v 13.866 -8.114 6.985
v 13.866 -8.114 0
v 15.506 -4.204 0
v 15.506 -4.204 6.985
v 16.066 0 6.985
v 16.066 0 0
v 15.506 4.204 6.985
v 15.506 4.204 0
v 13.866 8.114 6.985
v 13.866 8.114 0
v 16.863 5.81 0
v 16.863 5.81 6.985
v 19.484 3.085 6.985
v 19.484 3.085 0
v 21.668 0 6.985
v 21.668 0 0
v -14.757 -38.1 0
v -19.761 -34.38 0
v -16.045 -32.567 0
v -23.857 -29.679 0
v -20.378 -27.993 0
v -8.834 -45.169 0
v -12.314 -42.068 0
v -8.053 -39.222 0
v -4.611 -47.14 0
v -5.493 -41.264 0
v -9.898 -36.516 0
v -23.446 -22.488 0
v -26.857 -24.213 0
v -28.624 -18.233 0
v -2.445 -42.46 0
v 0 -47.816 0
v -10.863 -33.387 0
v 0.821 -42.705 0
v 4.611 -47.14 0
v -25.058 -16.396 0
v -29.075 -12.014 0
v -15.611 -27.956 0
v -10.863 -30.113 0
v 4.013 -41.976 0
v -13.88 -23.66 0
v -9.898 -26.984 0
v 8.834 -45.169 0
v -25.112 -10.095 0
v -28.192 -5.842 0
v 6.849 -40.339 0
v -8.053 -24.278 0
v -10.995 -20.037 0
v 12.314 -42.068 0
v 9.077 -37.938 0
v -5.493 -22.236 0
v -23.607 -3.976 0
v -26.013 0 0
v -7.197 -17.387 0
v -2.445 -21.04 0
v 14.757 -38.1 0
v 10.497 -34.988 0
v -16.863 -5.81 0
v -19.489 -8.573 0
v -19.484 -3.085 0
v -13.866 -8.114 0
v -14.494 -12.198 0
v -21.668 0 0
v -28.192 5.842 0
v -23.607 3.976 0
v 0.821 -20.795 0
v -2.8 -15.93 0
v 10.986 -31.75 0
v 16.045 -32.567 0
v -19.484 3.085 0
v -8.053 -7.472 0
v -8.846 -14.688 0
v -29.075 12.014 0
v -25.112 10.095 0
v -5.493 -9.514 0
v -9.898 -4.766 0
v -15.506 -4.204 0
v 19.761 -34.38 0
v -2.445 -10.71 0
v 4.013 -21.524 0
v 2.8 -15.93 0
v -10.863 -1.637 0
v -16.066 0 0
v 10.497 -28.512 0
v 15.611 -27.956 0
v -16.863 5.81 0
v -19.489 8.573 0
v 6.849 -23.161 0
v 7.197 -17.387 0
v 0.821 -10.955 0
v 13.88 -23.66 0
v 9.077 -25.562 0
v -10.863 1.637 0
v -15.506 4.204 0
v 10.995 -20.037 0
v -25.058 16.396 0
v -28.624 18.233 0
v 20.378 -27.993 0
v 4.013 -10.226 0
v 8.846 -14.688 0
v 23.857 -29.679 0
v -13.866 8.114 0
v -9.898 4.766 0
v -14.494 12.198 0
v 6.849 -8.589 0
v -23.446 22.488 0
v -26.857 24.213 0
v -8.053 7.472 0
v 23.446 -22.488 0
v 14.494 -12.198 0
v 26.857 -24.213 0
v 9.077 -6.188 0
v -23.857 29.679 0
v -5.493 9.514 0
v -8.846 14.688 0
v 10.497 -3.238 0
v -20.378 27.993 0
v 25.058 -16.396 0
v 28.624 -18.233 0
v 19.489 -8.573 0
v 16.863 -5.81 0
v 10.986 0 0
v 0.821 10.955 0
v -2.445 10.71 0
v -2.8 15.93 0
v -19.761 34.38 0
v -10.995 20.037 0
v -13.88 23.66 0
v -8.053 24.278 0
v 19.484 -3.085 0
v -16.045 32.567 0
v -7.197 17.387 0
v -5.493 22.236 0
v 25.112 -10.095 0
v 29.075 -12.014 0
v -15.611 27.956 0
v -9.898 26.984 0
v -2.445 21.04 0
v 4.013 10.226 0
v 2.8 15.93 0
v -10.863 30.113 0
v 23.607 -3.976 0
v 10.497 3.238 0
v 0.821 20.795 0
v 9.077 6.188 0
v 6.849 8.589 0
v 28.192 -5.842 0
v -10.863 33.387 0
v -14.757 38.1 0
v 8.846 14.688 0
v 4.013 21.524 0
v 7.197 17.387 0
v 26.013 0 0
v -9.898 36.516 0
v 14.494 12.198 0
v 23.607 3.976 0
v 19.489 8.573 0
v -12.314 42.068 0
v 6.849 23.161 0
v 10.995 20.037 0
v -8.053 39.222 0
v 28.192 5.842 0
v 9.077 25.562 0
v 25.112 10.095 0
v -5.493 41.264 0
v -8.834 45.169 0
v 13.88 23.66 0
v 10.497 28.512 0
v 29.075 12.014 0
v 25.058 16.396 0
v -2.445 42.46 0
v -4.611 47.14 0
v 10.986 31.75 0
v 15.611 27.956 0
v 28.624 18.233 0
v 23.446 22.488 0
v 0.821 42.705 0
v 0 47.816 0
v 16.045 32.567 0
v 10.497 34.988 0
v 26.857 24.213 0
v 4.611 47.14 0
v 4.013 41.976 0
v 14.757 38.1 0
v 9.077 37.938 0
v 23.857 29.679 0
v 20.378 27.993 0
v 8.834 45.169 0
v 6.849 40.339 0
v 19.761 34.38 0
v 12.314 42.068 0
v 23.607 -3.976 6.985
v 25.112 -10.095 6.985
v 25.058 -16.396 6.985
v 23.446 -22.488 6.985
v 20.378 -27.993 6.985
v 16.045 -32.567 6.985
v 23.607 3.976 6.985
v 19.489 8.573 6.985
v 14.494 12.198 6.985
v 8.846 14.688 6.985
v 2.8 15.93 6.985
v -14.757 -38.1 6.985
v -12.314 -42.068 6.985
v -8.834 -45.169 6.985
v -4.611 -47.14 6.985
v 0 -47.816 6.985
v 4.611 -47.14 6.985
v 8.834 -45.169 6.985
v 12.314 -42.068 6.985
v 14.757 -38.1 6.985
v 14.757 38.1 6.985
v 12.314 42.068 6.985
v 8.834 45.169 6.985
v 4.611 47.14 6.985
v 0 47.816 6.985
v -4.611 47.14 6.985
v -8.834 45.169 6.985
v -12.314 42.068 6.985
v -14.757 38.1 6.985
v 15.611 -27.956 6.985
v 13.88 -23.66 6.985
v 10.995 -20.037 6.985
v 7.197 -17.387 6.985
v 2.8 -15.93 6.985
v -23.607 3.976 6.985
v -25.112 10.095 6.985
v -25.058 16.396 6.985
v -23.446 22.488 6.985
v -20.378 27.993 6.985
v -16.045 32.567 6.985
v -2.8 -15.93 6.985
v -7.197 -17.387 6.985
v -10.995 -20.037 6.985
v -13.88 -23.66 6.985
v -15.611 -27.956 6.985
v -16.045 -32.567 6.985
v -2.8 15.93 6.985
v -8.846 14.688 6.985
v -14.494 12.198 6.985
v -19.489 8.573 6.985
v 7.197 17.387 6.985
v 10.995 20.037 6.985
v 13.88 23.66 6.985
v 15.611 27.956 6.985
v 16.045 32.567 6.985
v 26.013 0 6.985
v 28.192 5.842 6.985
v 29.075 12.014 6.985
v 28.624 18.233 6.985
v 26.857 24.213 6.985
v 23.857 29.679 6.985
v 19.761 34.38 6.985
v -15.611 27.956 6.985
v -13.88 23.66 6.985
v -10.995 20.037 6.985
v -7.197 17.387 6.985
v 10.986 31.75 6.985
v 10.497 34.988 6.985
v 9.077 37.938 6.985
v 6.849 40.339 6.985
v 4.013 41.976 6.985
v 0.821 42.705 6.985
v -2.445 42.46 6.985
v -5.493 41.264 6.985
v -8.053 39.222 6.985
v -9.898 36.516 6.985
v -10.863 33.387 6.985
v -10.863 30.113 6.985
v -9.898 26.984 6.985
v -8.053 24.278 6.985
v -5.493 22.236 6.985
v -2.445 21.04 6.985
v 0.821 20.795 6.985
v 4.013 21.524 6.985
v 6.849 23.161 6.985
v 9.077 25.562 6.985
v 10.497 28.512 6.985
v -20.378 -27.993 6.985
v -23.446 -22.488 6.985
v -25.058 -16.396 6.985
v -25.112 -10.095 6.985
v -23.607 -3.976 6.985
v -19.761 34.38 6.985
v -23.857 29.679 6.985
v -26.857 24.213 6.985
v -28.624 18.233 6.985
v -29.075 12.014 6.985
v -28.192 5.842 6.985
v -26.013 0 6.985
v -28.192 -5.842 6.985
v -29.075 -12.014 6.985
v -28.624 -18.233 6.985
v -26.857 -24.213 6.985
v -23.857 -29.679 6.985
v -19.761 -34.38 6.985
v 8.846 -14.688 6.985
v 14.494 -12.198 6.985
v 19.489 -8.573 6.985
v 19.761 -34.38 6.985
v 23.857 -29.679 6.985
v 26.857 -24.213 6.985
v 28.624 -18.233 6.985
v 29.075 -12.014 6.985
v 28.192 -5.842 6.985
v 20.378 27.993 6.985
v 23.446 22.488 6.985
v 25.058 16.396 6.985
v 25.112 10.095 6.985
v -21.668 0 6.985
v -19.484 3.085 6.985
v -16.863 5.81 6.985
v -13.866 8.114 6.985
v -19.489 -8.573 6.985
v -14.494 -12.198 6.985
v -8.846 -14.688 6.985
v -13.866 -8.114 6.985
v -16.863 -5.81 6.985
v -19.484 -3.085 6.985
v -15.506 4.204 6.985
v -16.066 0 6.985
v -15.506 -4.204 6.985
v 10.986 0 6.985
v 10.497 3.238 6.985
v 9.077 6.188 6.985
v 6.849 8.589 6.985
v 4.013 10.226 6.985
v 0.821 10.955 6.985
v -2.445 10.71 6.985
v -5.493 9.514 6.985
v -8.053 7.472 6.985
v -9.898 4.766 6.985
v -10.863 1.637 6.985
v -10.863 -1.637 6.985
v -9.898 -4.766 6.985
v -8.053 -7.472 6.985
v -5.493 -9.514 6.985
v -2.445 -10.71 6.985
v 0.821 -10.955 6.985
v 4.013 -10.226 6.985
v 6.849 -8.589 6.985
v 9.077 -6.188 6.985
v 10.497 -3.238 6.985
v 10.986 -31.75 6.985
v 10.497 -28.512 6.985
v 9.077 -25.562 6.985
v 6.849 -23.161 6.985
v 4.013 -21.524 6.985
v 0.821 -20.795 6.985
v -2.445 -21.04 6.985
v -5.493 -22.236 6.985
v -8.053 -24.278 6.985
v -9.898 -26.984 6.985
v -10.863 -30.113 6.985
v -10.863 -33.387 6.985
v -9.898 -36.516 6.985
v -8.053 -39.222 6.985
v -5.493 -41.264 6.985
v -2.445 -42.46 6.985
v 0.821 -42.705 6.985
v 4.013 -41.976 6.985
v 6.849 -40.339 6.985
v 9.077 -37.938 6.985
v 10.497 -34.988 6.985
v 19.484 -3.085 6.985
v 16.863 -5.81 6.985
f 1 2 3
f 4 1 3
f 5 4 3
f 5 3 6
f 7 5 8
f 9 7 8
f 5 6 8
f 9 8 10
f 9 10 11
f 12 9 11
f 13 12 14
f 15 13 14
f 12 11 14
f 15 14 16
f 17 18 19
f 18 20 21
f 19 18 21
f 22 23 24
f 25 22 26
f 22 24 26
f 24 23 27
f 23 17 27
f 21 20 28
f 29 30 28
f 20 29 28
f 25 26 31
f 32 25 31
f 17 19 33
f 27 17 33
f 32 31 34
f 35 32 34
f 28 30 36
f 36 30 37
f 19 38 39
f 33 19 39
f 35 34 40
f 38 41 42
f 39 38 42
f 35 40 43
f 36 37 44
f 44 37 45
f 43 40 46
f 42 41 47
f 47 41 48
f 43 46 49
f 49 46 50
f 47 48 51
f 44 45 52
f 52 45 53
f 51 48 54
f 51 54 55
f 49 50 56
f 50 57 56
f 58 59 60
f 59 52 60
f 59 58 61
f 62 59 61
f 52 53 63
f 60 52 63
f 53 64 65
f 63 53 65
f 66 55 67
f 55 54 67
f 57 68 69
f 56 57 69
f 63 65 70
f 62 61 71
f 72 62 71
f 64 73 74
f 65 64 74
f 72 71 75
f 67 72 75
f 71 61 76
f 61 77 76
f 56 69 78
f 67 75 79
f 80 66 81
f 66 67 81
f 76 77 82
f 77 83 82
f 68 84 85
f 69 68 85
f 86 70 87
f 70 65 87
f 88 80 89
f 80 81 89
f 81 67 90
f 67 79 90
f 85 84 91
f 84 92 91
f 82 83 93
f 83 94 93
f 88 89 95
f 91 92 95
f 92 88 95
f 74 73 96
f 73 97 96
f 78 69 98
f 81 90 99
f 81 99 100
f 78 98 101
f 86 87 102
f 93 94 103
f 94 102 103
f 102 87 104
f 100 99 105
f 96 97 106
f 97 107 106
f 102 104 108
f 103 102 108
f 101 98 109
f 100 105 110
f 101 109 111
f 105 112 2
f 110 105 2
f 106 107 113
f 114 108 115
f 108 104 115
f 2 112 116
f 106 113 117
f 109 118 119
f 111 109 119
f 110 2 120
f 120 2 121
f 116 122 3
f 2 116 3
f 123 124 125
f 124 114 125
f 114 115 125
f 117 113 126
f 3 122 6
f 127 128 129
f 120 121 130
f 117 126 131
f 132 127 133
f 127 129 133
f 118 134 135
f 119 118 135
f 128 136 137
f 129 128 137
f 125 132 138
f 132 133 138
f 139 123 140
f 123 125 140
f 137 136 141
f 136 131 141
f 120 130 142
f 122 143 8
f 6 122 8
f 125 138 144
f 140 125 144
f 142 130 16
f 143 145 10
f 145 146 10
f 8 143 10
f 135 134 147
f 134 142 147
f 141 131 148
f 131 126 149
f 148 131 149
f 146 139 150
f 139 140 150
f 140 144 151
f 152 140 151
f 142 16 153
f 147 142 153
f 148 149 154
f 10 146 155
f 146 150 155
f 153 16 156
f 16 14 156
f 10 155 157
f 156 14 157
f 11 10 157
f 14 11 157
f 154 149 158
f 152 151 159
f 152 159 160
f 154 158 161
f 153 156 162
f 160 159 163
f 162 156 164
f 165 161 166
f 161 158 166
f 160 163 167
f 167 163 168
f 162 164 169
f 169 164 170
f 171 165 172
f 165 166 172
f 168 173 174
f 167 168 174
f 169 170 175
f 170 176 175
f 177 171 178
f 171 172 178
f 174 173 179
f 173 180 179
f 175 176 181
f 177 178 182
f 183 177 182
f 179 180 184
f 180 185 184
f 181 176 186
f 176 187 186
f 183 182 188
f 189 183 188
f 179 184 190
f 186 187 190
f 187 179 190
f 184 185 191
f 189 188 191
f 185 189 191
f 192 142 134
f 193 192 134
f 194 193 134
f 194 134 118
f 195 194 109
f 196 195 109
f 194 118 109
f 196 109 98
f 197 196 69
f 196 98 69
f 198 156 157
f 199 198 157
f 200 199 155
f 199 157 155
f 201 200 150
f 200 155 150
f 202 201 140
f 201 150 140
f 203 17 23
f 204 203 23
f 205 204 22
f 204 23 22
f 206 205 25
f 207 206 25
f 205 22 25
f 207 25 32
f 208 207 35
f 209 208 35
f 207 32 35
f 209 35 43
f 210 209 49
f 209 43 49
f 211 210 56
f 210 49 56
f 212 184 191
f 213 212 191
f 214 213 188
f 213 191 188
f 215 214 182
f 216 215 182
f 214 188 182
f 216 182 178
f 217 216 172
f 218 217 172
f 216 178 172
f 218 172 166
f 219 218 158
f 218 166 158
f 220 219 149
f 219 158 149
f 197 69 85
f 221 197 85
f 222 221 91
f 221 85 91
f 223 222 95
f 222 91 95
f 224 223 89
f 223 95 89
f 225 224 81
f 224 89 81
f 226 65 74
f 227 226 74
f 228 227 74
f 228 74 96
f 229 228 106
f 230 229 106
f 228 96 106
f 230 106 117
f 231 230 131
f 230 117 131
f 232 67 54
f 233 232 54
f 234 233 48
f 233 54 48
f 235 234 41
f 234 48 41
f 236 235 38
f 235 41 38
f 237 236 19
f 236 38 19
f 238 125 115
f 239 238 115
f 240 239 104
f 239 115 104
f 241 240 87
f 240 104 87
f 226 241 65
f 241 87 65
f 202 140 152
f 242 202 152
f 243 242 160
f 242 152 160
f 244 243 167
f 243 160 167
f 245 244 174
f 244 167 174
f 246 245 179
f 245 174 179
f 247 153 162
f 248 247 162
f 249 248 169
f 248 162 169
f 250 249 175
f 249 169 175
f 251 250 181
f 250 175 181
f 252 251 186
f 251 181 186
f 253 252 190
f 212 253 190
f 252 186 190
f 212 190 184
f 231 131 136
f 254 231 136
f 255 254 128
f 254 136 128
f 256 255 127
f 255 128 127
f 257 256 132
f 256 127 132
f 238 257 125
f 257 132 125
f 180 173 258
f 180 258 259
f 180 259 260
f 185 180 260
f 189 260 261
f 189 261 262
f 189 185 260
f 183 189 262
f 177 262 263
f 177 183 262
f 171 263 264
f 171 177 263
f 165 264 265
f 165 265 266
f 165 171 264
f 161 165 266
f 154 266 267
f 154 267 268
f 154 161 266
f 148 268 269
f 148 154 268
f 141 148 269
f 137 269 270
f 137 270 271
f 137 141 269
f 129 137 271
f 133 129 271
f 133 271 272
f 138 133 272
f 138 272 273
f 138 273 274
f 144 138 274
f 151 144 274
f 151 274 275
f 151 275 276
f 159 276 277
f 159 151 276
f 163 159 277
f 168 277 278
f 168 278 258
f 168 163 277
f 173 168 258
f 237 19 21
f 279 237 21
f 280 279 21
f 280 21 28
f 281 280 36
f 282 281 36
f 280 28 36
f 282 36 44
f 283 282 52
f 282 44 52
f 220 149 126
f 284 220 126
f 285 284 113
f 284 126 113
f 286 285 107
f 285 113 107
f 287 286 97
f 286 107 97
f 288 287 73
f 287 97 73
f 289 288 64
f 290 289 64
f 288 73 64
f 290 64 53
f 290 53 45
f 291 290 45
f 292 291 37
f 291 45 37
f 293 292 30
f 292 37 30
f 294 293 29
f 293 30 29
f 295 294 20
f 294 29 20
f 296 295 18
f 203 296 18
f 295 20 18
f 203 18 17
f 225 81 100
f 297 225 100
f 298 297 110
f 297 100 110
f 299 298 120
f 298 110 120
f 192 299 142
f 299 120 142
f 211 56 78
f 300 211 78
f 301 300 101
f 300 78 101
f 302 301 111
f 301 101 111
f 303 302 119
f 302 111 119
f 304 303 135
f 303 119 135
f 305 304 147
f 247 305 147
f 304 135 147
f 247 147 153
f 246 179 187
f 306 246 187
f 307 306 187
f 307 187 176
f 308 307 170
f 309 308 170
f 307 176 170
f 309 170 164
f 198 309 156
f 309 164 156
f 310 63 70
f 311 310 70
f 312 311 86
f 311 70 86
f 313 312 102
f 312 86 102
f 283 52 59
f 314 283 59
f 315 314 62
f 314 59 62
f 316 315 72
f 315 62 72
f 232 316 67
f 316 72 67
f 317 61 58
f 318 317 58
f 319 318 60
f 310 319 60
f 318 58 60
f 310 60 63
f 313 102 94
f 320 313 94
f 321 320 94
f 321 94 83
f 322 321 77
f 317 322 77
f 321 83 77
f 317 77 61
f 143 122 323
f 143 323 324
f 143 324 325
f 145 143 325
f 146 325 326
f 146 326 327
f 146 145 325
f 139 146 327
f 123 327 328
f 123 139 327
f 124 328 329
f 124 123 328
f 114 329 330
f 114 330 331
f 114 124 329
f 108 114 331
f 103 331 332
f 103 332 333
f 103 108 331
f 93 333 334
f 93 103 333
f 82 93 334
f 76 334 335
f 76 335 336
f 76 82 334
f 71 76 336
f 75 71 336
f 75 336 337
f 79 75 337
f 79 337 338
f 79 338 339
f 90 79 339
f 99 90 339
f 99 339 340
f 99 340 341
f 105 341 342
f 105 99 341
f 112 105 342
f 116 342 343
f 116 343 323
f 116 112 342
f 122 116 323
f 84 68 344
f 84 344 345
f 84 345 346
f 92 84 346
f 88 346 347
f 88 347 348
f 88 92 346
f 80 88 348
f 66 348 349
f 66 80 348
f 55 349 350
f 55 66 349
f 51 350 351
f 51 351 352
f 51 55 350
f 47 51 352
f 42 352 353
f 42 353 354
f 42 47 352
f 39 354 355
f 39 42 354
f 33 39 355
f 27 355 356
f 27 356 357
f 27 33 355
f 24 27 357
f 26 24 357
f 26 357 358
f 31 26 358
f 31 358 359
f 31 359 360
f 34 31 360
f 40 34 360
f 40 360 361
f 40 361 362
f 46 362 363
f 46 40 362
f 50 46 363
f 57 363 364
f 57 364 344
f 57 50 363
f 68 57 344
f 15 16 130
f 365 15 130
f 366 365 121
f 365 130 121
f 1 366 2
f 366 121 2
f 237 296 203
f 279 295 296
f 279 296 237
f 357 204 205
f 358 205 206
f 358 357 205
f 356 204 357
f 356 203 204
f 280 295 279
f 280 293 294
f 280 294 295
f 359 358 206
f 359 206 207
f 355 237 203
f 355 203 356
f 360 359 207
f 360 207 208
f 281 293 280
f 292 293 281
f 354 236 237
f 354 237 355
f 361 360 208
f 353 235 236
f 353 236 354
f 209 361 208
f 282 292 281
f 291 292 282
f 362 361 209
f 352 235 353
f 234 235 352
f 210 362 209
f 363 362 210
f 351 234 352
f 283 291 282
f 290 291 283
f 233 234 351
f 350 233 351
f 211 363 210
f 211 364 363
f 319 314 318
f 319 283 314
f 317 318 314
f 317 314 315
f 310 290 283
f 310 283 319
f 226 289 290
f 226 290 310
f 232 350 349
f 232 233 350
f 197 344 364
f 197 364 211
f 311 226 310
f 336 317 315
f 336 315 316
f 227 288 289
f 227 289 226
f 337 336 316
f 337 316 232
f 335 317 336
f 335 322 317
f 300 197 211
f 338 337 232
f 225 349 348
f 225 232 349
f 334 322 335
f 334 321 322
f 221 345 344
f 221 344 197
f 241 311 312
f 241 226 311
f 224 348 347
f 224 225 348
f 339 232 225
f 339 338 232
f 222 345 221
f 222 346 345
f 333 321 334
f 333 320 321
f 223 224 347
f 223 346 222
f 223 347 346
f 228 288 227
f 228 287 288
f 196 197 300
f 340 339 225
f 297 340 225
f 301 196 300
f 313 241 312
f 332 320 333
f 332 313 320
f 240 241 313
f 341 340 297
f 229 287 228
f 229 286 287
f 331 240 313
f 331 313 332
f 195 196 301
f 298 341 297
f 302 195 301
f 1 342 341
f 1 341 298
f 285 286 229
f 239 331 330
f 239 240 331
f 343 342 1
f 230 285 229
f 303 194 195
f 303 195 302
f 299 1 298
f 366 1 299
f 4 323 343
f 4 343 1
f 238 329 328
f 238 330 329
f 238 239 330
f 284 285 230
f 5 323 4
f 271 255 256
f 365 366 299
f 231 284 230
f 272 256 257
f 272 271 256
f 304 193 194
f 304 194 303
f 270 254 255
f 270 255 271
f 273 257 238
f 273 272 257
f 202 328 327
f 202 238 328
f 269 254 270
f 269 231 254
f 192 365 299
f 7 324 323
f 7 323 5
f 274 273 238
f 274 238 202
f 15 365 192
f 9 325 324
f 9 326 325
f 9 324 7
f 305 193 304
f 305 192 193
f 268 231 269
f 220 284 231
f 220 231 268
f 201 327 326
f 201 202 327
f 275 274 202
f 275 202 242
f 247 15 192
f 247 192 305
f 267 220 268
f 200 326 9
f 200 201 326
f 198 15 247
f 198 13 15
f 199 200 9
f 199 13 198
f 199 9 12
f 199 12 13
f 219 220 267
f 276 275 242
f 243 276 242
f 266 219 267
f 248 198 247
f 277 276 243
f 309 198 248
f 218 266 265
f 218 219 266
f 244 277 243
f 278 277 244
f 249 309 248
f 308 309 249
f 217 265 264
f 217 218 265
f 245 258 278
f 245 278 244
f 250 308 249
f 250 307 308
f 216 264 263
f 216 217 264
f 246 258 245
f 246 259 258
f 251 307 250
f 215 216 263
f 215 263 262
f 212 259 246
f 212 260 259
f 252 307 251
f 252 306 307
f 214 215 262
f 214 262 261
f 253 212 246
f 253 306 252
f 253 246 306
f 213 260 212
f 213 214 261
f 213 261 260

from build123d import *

# Parameters (mm, degrees)
F0_R     = 10.9855
F1_DEPTH = 6.985


with BuildPart() as f1:
    # F0 (on Top) → F1 (new body)
    with BuildSketch(Plane.XY):
        with BuildLine():
            ThreePointArc((-21.668307594, 0), (-18.2243869403, 4.4968425779), (-13.8658100212, 8.1141606286))
            ThreePointArc((-13.8658100212, 8.1141606286), (-16.0655, 0), (-13.8658100212, -8.1141606286))
            ThreePointArc((-13.8658100212, -8.1141606286), (-9.0413202093, -13.2798651771), (-2.4667114241, -15.875))
            ThreePointArc((-2.4667114241, -15.875), (-2.6336178966, -15.9018345849), (-2.8002327647, -15.9304239401))
            ThreePointArc((-2.8002327647, -15.9304239401), (-12.5689671865, -21.743934134), (-16.044699379, -32.5672588867))
            ThreePointArc((-16.044699379, -32.5672588867), (-15.6474770652, -35.3909822497), (-14.75729617, -38.1))
            ThreePointArc((-14.75729617, -38.1), (0, -47.8155), (14.75729617, -38.1))
            ThreePointArc((14.75729617, -38.1), (15.6474770652, -35.3909822497), (16.044699379, -32.5672588867))
            ThreePointArc((16.044699379, -32.5672588867), (12.5689671865, -21.743934134), (2.8002327647, -15.9304239401))
            ThreePointArc((2.8002327647, -15.9304239401), (2.6336178966, -15.9018345849), (2.4667114241, -15.875))
            ThreePointArc((2.4667114241, -15.875), (9.0413202093, -13.2798651771), (13.8658100212, -8.1141606286))
            ThreePointArc((13.8658100212, -8.1141606286), (16.0655, 0), (13.8658100212, 8.1141606286))
            ThreePointArc((13.8658100212, 8.1141606286), (18.2243869403, 4.4968425779), (21.668307594, 0))
            ThreePointArc((21.668307594, 0), (22.7248224192, 1.9453544448), (23.6071191459, 3.9756696857))
            ThreePointArc((23.6071191459, 3.9756696857), (14.4936570973, 12.1982197779), (2.8002327647, 15.9304239401))
            ThreePointArc((2.8002327647, 15.9304239401), (12.5689671865, 21.743934134), (16.044699379, 32.5672588867))
            ThreePointArc((16.044699379, 32.5672588867), (15.6474770652, 35.3909822497), (14.75729617, 38.1))
            ThreePointArc((14.75729617, 38.1), (0, 47.8155), (-14.75729617, 38.1))
            ThreePointArc((-14.75729617, 38.1), (-15.6474770652, 35.3909822497), (-16.044699379, 32.5672588867))
            ThreePointArc((-16.044699379, 32.5672588867), (-12.5689671865, 21.743934134), (-2.8002327647, 15.9304239401))
            ThreePointArc((-2.8002327647, 15.9304239401), (-14.4936570973, 12.1982197779), (-23.6071191459, 3.9756696857))
            ThreePointArc((-23.6071191459, 3.9756696857), (-22.7248224192, 1.9453544448), (-21.668307594, 0))
        make_face()
        with Locations((0, -31.75)):
            Circle(F0_R, mode=Mode.SUBTRACT)
        Circle(F0_R, mode=Mode.SUBTRACT)
        with Locations((0, 31.75)):
            Circle(F0_R, mode=Mode.SUBTRACT)
        with BuildLine():
            ThreePointArc((-23.6071191459, -3.9756696857), (-22.7248224192, -1.9453544448), (-21.668307594, 0))
            ThreePointArc((-21.668307594, 0), (-22.7248224192, 1.9453544448), (-23.6071191459, 3.9756696857))
            ThreePointArc((-23.6071191459, 3.9756696857), (-24.8896850265, 2.0359533325), (-26.013236893, 0))
            ThreePointArc((-26.013236893, 0), (-24.8896850265, -2.0359533325), (-23.6071191459, -3.9756696857))
        make_face()
        with BuildLine():
            ThreePointArc((-26.013236893, 0), (-24.8896850265, 2.0359533325), (-23.6071191459, 3.9756696857))
            ThreePointArc((-23.6071191459, 3.9756696857), (-24.4425125824, 19.4925468905), (-16.044699379, 32.5672588867))
            ThreePointArc((-16.044699379, 32.5672588867), (-15.6474770652, 35.3909822497), (-14.75729617, 38.1))
            ThreePointArc((-14.75729617, 38.1), (-27.9009245646, 21.2703622392), (-26.013236893, 0))
        make_face()
        with BuildLine():
            ThreePointArc((-16.044699379, -32.5672588867), (-24.4425125824, -19.4925468905), (-23.6071191459, -3.9756696857))
            ThreePointArc((-23.6071191459, -3.9756696857), (-24.8896850265, -2.0359533325), (-26.013236893, 0))
            ThreePointArc((-26.013236893, 0), (-27.9009245646, -21.2703622392), (-14.75729617, -38.1))
            ThreePointArc((-14.75729617, -38.1), (-15.6474770652, -35.3909822497), (-16.044699379, -32.5672588867))
        make_face()
        with BuildLine():
            ThreePointArc((26.013236893, 0), (27.9009245646, 21.2703622392), (14.75729617, 38.1))
            ThreePointArc((14.75729617, 38.1), (15.6474770652, 35.3909822497), (16.044699379, 32.5672588867))
            ThreePointArc((16.044699379, 32.5672588867), (24.4425125824, 19.4925468905), (23.6071191459, 3.9756696857))
            ThreePointArc((23.6071191459, 3.9756696857), (24.8896850265, 2.0359533325), (26.013236893, 0))
        make_face()
        with BuildLine():
            ThreePointArc((16.044699379, -32.5672588867), (15.6474770652, -35.3909822497), (14.75729617, -38.1))
            ThreePointArc((14.75729617, -38.1), (27.9009245646, -21.2703622392), (26.013236893, 0))
            ThreePointArc((26.013236893, 0), (24.8896850265, -2.0359533325), (23.6071191459, -3.9756696857))
            ThreePointArc((23.6071191459, -3.9756696857), (24.4425125824, -19.4925468905), (16.044699379, -32.5672588867))
        make_face()
        with BuildLine():
            ThreePointArc((23.6071191459, -3.9756696857), (24.8896850265, -2.0359533325), (26.013236893, 0))
            ThreePointArc((26.013236893, 0), (24.8896850265, 2.0359533325), (23.6071191459, 3.9756696857))
            ThreePointArc((23.6071191459, 3.9756696857), (22.7248224192, 1.9453544448), (21.668307594, 0))
            ThreePointArc((21.668307594, 0), (22.7248224192, -1.9453544448), (23.6071191459, -3.9756696857))
        make_face()
        with BuildLine():
            ThreePointArc((-2.4667114241, -15.875), (-9.0413202093, -13.2798651771), (-13.8658100212, -8.1141606286))
            ThreePointArc((-13.8658100212, -8.1141606286), (-18.2243869403, -4.4968425779), (-21.668307594, 0))
            ThreePointArc((-21.668307594, 0), (-22.7248224192, -1.9453544448), (-23.6071191459, -3.9756696857))
            ThreePointArc((-23.6071191459, -3.9756696857), (-14.4936570973, -12.1982197779), (-2.8002327647, -15.9304239401))
            ThreePointArc((-2.8002327647, -15.9304239401), (-2.6336178966, -15.9018345849), (-2.4667114241, -15.875))
        make_face()
        with BuildLine():
            ThreePointArc((2.8002327647, -15.9304239401), (14.4936570973, -12.1982197779), (23.6071191459, -3.9756696857))
            ThreePointArc((23.6071191459, -3.9756696857), (22.7248224192, -1.9453544448), (21.668307594, 0))
            ThreePointArc((21.668307594, 0), (18.2243869403, -4.4968425779), (13.8658100212, -8.1141606286))
            ThreePointArc((13.8658100212, -8.1141606286), (9.0413202093, -13.2798651771), (2.4667114241, -15.875))
            ThreePointArc((2.4667114241, -15.875), (2.6336178966, -15.9018345849), (2.8002327647, -15.9304239401))
        make_face()
    extrude(amount=F1_DEPTH)


solid = f1.part
